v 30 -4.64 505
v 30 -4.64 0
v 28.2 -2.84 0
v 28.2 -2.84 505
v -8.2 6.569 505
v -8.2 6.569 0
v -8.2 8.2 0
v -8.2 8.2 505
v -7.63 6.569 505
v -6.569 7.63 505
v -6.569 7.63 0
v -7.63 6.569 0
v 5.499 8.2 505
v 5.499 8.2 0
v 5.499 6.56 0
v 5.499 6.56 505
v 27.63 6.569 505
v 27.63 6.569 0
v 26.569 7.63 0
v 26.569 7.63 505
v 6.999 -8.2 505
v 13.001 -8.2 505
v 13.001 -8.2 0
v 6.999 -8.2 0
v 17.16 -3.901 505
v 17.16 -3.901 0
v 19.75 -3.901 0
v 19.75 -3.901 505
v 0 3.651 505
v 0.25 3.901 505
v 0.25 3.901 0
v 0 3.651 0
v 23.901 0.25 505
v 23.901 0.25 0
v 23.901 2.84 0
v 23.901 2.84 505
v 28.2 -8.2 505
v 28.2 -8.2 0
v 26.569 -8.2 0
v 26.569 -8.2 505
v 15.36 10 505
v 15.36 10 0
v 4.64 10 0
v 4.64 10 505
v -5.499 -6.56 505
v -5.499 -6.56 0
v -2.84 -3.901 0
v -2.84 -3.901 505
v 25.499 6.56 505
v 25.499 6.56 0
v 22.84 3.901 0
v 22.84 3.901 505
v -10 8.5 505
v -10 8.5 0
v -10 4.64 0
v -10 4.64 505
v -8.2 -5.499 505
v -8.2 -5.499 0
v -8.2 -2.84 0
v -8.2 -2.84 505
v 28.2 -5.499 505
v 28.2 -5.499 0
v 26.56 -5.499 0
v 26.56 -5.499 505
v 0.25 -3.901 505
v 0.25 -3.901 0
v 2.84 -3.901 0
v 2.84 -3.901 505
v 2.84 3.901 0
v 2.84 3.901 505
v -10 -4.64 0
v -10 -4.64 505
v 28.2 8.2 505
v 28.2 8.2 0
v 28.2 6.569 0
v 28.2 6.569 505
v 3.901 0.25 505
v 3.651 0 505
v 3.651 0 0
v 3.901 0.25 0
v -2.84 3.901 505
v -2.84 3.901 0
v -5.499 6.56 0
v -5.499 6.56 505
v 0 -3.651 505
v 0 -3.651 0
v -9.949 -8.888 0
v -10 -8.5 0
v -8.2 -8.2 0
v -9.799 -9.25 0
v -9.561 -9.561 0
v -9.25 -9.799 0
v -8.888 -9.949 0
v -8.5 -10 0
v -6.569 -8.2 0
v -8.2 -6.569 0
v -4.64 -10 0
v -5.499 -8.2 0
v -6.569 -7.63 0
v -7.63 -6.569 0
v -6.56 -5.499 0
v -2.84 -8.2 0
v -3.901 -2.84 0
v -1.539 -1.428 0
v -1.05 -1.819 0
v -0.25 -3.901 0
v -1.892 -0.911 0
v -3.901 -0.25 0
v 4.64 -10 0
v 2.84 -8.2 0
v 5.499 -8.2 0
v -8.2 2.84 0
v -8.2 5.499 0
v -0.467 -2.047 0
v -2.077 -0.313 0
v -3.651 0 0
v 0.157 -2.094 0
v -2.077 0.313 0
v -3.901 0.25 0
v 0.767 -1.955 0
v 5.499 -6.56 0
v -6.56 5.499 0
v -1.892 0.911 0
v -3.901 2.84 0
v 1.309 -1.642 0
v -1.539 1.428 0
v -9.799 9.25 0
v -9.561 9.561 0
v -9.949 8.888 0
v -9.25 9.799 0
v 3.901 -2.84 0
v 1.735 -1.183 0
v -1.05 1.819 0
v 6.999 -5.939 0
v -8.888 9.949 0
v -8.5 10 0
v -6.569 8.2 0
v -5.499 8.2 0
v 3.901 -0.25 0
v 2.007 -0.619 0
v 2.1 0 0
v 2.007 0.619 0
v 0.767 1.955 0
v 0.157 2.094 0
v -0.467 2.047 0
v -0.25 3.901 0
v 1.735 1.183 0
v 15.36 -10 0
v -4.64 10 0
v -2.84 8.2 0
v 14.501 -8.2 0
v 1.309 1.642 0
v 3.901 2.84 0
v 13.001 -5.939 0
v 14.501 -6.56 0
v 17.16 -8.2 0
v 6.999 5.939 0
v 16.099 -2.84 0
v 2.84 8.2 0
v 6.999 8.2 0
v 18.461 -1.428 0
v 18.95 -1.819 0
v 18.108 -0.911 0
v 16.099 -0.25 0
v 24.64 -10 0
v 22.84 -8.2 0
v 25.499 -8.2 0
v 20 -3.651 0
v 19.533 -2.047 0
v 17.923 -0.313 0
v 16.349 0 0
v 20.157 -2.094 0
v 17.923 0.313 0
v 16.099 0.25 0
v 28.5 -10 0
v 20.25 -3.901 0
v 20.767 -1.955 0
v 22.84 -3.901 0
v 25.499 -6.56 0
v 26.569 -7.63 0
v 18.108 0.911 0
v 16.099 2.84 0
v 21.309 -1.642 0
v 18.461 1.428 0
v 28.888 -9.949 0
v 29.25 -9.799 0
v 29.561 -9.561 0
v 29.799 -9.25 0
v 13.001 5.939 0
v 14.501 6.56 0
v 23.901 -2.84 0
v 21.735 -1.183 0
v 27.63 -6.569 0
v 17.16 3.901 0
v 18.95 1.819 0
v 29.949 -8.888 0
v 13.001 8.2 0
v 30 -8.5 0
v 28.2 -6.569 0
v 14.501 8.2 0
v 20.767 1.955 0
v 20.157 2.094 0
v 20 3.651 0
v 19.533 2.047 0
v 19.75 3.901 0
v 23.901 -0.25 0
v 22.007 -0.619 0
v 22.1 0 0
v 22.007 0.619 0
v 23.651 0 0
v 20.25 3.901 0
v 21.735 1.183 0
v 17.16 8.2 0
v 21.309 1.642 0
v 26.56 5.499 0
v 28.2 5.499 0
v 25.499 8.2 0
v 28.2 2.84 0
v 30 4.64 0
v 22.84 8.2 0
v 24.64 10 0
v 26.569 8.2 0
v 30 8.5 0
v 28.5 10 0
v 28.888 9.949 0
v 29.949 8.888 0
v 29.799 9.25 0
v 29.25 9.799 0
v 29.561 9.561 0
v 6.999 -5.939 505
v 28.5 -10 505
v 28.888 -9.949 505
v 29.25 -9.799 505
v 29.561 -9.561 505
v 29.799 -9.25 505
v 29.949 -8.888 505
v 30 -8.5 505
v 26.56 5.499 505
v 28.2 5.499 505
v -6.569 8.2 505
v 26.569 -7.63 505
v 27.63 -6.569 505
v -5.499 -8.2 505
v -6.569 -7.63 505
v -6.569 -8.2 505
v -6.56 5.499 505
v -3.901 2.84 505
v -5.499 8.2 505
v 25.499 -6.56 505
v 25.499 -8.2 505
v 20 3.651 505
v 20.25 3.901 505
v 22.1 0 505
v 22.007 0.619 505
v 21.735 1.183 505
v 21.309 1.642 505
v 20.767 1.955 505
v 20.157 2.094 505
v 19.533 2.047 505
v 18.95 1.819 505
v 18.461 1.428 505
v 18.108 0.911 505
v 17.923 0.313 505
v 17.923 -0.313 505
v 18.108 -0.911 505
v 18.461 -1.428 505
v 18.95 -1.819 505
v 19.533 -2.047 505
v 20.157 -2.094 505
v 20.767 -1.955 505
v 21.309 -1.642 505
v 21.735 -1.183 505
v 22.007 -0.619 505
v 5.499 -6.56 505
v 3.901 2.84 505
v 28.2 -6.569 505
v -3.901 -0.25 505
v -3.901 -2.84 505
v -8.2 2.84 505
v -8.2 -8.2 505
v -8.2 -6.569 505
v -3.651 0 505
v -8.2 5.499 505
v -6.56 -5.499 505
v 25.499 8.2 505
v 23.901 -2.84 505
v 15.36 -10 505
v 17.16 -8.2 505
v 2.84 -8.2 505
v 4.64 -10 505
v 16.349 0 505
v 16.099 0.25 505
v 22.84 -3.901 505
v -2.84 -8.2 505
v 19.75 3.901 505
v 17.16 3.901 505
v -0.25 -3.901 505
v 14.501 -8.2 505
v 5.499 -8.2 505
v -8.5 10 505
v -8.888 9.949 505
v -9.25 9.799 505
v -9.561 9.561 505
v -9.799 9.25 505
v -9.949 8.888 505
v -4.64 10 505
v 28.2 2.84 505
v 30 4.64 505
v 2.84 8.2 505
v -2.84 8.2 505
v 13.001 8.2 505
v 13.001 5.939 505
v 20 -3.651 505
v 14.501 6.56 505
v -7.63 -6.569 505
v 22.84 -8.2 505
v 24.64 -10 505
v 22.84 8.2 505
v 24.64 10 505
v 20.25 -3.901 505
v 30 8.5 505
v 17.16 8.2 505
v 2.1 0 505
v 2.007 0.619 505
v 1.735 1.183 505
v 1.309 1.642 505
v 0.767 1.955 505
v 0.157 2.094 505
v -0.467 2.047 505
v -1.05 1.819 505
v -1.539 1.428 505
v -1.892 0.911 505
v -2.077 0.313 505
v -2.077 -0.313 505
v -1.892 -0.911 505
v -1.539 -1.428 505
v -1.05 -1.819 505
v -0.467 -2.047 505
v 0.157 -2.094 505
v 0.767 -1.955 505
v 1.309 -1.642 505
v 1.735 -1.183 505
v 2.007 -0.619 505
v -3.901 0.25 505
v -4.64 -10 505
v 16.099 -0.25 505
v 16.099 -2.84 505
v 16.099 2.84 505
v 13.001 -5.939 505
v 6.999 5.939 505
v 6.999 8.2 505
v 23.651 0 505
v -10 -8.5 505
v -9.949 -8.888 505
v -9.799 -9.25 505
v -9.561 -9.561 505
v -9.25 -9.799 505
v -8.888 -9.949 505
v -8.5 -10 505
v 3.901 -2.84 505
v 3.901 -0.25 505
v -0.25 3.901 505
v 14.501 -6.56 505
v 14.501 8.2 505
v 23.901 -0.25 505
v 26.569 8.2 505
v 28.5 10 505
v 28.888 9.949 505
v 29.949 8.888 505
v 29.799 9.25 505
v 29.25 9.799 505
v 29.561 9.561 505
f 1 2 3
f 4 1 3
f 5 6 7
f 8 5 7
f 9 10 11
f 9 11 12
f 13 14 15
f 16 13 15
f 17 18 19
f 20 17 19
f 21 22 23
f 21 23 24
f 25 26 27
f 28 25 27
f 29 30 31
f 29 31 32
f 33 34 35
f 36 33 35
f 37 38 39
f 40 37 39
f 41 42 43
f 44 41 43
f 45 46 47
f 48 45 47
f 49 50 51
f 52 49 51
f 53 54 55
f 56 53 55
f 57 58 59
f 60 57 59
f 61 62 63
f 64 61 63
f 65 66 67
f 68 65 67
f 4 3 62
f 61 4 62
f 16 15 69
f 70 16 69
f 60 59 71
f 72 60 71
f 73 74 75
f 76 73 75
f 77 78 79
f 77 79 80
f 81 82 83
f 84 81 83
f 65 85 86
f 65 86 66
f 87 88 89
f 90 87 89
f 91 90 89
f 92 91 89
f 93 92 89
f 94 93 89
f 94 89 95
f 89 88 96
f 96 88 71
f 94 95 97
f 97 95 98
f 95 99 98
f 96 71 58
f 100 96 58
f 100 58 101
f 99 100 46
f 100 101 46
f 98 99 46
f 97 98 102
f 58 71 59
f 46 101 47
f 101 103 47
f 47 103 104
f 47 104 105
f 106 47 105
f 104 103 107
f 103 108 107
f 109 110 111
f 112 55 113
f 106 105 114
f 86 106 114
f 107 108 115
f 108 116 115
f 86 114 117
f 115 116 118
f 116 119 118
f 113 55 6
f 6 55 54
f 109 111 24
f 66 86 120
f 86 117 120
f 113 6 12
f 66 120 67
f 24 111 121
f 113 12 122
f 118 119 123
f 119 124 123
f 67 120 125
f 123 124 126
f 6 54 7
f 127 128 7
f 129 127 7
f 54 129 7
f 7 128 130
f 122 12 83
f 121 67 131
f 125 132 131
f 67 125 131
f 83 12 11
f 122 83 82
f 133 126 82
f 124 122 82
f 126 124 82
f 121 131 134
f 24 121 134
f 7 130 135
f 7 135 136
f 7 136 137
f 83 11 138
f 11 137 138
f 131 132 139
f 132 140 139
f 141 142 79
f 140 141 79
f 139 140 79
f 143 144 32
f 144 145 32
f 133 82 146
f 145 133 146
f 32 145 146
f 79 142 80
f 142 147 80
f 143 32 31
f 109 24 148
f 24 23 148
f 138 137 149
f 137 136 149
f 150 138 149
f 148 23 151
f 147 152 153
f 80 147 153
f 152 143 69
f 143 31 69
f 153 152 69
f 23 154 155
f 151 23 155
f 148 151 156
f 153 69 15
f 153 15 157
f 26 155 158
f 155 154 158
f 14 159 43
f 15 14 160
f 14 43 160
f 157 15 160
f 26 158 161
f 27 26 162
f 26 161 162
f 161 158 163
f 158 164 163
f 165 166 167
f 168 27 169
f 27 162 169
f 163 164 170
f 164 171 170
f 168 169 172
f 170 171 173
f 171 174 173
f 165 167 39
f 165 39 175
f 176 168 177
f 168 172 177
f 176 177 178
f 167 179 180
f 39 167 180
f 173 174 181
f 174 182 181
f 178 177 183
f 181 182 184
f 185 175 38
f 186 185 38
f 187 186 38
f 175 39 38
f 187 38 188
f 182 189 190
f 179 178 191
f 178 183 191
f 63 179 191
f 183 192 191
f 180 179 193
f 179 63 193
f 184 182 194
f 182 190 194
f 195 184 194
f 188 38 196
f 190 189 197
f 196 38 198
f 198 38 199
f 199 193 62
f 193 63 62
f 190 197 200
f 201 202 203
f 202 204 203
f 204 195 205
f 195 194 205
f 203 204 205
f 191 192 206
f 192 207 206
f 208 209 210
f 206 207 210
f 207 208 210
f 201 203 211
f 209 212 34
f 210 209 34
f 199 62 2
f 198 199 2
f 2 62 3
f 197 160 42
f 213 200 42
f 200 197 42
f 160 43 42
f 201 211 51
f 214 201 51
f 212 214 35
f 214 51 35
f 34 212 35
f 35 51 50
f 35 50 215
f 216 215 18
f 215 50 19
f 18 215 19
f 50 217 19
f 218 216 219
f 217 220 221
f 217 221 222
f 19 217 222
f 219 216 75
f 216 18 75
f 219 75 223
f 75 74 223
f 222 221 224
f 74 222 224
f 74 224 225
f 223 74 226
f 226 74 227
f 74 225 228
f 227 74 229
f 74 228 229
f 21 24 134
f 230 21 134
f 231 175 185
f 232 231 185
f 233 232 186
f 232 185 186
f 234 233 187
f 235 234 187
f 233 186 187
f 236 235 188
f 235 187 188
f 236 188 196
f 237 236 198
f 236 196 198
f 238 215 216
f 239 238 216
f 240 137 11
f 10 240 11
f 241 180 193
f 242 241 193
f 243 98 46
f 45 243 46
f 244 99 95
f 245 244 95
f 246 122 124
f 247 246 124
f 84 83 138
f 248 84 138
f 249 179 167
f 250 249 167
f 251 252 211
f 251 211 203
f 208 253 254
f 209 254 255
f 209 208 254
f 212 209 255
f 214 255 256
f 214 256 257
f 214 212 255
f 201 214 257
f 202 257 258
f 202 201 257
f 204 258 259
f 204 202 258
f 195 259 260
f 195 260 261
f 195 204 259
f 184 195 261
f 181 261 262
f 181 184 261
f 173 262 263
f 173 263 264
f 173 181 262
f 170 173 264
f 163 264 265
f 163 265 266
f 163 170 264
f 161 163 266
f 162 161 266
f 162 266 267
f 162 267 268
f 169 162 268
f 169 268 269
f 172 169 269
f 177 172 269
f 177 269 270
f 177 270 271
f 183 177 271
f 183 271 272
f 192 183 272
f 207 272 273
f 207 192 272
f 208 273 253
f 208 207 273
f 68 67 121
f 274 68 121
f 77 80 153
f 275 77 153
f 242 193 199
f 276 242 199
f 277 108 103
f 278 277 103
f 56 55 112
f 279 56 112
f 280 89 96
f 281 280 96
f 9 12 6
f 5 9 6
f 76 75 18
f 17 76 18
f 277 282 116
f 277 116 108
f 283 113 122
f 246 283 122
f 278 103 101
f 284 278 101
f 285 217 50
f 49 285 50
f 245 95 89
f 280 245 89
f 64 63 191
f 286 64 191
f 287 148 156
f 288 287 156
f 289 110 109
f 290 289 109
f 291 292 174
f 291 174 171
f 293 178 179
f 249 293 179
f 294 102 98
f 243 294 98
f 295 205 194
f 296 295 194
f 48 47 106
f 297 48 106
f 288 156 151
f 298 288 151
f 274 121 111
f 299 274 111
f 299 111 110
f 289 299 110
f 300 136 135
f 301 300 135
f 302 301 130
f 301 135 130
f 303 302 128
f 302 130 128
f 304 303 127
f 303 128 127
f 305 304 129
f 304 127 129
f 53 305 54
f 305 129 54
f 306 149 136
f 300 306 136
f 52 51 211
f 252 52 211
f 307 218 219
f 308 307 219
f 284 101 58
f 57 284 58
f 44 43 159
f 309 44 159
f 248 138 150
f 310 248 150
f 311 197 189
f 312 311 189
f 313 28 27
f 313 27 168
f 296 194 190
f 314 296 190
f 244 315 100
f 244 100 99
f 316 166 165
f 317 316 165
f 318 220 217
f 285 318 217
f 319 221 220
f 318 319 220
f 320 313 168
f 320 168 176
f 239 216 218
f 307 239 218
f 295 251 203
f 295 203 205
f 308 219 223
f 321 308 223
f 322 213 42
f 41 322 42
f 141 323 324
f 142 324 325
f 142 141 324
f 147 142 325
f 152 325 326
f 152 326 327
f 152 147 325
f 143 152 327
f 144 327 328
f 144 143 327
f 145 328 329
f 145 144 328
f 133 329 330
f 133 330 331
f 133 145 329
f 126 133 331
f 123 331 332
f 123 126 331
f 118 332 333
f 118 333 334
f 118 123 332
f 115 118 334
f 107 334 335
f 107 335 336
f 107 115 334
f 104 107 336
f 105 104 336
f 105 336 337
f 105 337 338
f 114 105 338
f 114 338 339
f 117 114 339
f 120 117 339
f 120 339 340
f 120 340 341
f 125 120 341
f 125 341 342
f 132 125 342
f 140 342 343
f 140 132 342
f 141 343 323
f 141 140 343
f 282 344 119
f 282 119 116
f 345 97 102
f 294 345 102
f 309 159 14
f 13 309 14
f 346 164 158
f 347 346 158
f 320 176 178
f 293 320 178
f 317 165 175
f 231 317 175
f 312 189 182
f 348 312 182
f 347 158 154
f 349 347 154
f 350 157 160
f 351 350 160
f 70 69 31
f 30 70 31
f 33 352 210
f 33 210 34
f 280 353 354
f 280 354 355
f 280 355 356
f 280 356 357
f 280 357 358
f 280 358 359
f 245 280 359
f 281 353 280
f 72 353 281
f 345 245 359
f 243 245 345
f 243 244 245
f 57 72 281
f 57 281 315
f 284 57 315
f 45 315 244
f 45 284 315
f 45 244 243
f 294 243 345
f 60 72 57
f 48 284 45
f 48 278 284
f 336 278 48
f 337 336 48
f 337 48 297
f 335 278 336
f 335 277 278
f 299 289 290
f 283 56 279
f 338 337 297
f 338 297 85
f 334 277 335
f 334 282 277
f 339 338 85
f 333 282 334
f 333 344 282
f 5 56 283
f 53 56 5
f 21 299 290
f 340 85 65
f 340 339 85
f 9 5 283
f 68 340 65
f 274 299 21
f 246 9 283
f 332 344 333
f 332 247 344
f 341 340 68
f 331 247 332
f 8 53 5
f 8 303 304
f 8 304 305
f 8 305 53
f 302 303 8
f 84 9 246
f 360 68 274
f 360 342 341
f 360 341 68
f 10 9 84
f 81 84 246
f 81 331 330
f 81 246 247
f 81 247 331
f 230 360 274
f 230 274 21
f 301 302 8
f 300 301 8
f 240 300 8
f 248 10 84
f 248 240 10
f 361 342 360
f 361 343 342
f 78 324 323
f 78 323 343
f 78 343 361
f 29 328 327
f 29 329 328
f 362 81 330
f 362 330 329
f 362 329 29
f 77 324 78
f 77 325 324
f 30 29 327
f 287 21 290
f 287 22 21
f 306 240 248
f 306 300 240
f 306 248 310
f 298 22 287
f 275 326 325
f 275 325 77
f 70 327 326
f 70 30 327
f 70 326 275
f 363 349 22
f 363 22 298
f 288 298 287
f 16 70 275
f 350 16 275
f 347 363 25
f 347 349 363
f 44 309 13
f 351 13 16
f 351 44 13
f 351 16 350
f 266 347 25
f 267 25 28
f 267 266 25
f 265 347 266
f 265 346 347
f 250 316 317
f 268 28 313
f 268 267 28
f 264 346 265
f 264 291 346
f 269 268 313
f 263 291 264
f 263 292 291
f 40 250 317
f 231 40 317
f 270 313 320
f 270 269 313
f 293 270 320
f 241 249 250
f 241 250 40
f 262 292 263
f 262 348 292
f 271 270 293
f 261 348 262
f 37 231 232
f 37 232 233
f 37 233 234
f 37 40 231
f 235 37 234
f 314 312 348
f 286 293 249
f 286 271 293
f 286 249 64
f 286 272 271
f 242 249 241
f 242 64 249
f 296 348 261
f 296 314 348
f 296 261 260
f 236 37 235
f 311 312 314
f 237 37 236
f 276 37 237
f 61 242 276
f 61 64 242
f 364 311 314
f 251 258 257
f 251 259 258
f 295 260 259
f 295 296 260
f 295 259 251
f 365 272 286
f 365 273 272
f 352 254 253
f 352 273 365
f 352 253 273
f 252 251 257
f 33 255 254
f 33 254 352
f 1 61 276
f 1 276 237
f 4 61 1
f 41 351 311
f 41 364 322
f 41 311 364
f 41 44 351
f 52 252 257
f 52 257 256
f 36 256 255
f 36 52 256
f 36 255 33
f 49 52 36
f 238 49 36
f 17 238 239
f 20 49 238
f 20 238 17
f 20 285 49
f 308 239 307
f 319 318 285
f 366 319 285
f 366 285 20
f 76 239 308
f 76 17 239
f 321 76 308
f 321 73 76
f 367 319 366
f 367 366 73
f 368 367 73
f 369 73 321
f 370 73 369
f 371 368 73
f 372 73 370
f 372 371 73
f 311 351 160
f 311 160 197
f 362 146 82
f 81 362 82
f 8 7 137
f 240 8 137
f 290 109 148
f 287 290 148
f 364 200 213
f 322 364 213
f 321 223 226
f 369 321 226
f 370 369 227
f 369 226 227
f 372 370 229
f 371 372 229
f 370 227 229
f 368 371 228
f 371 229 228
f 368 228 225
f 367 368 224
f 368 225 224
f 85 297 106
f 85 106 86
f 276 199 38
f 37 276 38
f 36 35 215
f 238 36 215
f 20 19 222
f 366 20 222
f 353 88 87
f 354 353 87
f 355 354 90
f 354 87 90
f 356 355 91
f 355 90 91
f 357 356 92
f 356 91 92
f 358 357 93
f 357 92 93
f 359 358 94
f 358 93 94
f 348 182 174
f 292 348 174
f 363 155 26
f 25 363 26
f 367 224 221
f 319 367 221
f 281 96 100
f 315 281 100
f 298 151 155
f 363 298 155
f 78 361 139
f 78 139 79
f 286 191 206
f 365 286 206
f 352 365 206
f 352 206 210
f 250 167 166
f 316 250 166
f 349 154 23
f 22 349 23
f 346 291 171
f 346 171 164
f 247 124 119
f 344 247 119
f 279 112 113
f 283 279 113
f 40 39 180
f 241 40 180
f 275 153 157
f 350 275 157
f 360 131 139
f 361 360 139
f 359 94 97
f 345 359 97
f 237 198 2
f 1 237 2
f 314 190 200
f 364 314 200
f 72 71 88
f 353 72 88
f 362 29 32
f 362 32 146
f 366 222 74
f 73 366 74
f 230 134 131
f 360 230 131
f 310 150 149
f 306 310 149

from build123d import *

# Parameters (mm, degrees)
F0_R     = 2.1
F1_DEPTH = 505


with BuildPart() as f1:
    # F0 (on Top) → F1 (new body)
    with BuildSketch(Plane.XY):
        with BuildLine():
            Line((4.64, -10), (8.5, -10))
            Line((8.5, -10), (11.5, -10))
            Line((11.5, -10), (15.36, -10))
            Line((15.36, -10), (17.16, -8.2))
            Line((17.16, -8.2), (14.50066, -8.2))
            Line((14.50066, -8.2), (14.50066, -6.56))
            Line((14.50066, -6.56), (17.16, -3.90066))
            Line((17.16, -3.90066), (19.75, -3.90066))
            Line((19.75, -3.90066), (20, -3.65066))
            Line((20, -3.65066), (20.25, -3.90066))
            Line((20.25, -3.90066), (22.84, -3.90066))
            Line((22.84, -3.90066), (25.49934, -6.56))
            Line((25.49934, -6.56), (25.49934, -8.2))
            Line((25.49934, -8.2), (22.84, -8.2))
            Line((22.84, -8.2), (24.64, -10))
            Line((24.64, -10), (28.5, -10))
            ThreePointArc((28.5, -10), (29.56066, -9.56066), (30, -8.5))
            Line((30, -8.5), (30, -4.64))
            Line((30, -4.64), (28.2, -2.84))
            Line((28.2, -2.84), (28.2, -5.49934))
            Line((28.2, -5.49934), (26.56, -5.49934))
            Line((26.56, -5.49934), (23.90066, -2.84))
            Line((23.90066, -2.84), (23.90066, -0.25))
            Line((23.90066, -0.25), (23.65066, 0))
            Line((23.65066, 0), (23.90066, 0.25))
            Line((23.90066, 0.25), (23.90066, 2.84))
            Line((23.90066, 2.84), (26.56, 5.49934))
            Line((26.56, 5.49934), (28.2, 5.49934))
            Line((28.2, 5.49934), (28.2, 2.84))
            Line((28.2, 2.84), (30, 4.64))
            Line((30, 4.64), (30, 8.5))
            ThreePointArc((30, 8.5), (29.56066, 9.56066), (28.5, 10))
            Line((28.5, 10), (24.64, 10))
            Line((24.64, 10), (22.84, 8.2))
            Line((22.84, 8.2), (25.49934, 8.2))
            Line((25.49934, 8.2), (25.49934, 6.56))
            Line((25.49934, 6.56), (22.84, 3.90066))
            Line((22.84, 3.90066), (20.25, 3.90066))
            Line((20.25, 3.90066), (20, 3.65066))
            Line((20, 3.65066), (19.75, 3.90066))
            Line((19.75, 3.90066), (17.16, 3.90066))
            Line((17.16, 3.90066), (14.50066, 6.56))
            Line((14.50066, 6.56), (14.50066, 8.2))
            Line((14.50066, 8.2), (17.16, 8.2))
            Line((17.16, 8.2), (15.36, 10))
            Line((15.36, 10), (11.5, 10))
            Line((11.5, 10), (8.5, 10))
            Line((8.5, 10), (4.64, 10))
            Line((4.64, 10), (2.84, 8.2))
            Line((2.84, 8.2), (5.49934, 8.2))
            Line((5.49934, 8.2), (5.49934, 6.56))
            Line((5.49934, 6.56), (2.84, 3.90066))
            Line((2.84, 3.90066), (0.25, 3.90066))
            Line((0.25, 3.90066), (0, 3.65066))
            Line((0, 3.65066), (-0.25, 3.90066))
            Line((-0.25, 3.90066), (-2.84, 3.90066))
            Line((-2.84, 3.90066), (-5.49934, 6.56))
            Line((-5.49934, 6.56), (-5.49934, 8.2))
            Line((-5.49934, 8.2), (-2.84, 8.2))
            Line((-2.84, 8.2), (-4.64, 10))
            Line((-4.64, 10), (-8.5, 10))
            ThreePointArc((-8.5, 10), (-9.56066, 9.56066), (-10, 8.5))
            Line((-10, 8.5), (-10, 4.64))
            Line((-10, 4.64), (-8.2, 2.84))
            Line((-8.2, 2.84), (-8.2, 5.49934))
            Line((-8.2, 5.49934), (-6.56, 5.49934))
            Line((-6.56, 5.49934), (-3.90066, 2.84))
            Line((-3.90066, 2.84), (-3.90066, 0.25))
            Line((-3.90066, 0.25), (-3.65066, 0))
            Line((-3.65066, 0), (-3.90066, -0.25))
            Line((-3.90066, -0.25), (-3.90066, -2.84))
            Line((-3.90066, -2.84), (-6.56, -5.49934))
            Line((-6.56, -5.49934), (-8.2, -5.49934))
            Line((-8.2, -5.49934), (-8.2, -2.84))
            Line((-8.2, -2.84), (-10, -4.64))
            Line((-10, -4.64), (-10, -8.5))
            ThreePointArc((-10, -8.5), (-9.56066, -9.56066), (-8.5, -10))
            Line((-8.5, -10), (-4.64, -10))
            Line((-4.64, -10), (-2.84, -8.2))
            Line((-2.84, -8.2), (-5.49934, -8.2))
            Line((-5.49934, -8.2), (-5.49934, -6.56))
            Line((-5.49934, -6.56), (-2.84, -3.90066))
            Line((-2.84, -3.90066), (-0.25, -3.90066))
            Line((-0.25, -3.90066), (0, -3.65066))
            Line((0, -3.65066), (0.25, -3.90066))
            Line((0.25, -3.90066), (2.84, -3.90066))
            Line((2.84, -3.90066), (5.49934, -6.56))
            Line((5.49934, -6.56), (5.49934, -8.2))
            Line((5.49934, -8.2), (2.84, -8.2))
            Line((2.84, -8.2), (4.64, -10))
        make_face()
        Polygon((-6.56934, -7.63), (-6.56934, -8.2), (-8.2, -8.2), (-8.2, -6.56934), (-7.63, -6.56934), align=None, mode=Mode.SUBTRACT)
        Polygon((27.63, -6.56934), (28.2, -6.56934), (28.2, -8.2), (26.56934, -8.2), (26.56934, -7.63), align=None, mode=Mode.SUBTRACT)
        Circle(F0_R, mode=Mode.SUBTRACT)
        Polygon((-7.63, 6.56934), (-8.2, 6.56934), (-8.2, 8.2), (-6.56934, 8.2), (-6.56934, 7.63), align=None, mode=Mode.SUBTRACT)
        Polygon((3.90066, 2.84), (6.56, 5.49934), (6.99934, 5.93868), (6.99934, 8.2), (13.00066, 8.2), (13.00066, 5.93868), (13.44, 5.49934), (16.09934, 2.84), (16.09934, 0.25), (16.34934, 0), (16.09934, -0.25), (16.09934, -2.84), (13.44, -5.49934), (13.00066, -5.93868), (13.00066, -8.2), (6.99934, -8.2), (6.99934, -5.93868), (6.56, -5.49934), (3.90066, -2.84), (3.90066, -0.25), (3.65066, 0), (3.90066, 0.25), align=None, mode=Mode.SUBTRACT)
        with Locations((20, 0)):
            Circle(F0_R, mode=Mode.SUBTRACT)
        Polygon((28.2, 8.2), (28.2, 6.56934), (27.63, 6.56934), (26.56934, 7.63), (26.56934, 8.2), align=None, mode=Mode.SUBTRACT)
    extrude(amount=F1_DEPTH)


solid = f1.part
